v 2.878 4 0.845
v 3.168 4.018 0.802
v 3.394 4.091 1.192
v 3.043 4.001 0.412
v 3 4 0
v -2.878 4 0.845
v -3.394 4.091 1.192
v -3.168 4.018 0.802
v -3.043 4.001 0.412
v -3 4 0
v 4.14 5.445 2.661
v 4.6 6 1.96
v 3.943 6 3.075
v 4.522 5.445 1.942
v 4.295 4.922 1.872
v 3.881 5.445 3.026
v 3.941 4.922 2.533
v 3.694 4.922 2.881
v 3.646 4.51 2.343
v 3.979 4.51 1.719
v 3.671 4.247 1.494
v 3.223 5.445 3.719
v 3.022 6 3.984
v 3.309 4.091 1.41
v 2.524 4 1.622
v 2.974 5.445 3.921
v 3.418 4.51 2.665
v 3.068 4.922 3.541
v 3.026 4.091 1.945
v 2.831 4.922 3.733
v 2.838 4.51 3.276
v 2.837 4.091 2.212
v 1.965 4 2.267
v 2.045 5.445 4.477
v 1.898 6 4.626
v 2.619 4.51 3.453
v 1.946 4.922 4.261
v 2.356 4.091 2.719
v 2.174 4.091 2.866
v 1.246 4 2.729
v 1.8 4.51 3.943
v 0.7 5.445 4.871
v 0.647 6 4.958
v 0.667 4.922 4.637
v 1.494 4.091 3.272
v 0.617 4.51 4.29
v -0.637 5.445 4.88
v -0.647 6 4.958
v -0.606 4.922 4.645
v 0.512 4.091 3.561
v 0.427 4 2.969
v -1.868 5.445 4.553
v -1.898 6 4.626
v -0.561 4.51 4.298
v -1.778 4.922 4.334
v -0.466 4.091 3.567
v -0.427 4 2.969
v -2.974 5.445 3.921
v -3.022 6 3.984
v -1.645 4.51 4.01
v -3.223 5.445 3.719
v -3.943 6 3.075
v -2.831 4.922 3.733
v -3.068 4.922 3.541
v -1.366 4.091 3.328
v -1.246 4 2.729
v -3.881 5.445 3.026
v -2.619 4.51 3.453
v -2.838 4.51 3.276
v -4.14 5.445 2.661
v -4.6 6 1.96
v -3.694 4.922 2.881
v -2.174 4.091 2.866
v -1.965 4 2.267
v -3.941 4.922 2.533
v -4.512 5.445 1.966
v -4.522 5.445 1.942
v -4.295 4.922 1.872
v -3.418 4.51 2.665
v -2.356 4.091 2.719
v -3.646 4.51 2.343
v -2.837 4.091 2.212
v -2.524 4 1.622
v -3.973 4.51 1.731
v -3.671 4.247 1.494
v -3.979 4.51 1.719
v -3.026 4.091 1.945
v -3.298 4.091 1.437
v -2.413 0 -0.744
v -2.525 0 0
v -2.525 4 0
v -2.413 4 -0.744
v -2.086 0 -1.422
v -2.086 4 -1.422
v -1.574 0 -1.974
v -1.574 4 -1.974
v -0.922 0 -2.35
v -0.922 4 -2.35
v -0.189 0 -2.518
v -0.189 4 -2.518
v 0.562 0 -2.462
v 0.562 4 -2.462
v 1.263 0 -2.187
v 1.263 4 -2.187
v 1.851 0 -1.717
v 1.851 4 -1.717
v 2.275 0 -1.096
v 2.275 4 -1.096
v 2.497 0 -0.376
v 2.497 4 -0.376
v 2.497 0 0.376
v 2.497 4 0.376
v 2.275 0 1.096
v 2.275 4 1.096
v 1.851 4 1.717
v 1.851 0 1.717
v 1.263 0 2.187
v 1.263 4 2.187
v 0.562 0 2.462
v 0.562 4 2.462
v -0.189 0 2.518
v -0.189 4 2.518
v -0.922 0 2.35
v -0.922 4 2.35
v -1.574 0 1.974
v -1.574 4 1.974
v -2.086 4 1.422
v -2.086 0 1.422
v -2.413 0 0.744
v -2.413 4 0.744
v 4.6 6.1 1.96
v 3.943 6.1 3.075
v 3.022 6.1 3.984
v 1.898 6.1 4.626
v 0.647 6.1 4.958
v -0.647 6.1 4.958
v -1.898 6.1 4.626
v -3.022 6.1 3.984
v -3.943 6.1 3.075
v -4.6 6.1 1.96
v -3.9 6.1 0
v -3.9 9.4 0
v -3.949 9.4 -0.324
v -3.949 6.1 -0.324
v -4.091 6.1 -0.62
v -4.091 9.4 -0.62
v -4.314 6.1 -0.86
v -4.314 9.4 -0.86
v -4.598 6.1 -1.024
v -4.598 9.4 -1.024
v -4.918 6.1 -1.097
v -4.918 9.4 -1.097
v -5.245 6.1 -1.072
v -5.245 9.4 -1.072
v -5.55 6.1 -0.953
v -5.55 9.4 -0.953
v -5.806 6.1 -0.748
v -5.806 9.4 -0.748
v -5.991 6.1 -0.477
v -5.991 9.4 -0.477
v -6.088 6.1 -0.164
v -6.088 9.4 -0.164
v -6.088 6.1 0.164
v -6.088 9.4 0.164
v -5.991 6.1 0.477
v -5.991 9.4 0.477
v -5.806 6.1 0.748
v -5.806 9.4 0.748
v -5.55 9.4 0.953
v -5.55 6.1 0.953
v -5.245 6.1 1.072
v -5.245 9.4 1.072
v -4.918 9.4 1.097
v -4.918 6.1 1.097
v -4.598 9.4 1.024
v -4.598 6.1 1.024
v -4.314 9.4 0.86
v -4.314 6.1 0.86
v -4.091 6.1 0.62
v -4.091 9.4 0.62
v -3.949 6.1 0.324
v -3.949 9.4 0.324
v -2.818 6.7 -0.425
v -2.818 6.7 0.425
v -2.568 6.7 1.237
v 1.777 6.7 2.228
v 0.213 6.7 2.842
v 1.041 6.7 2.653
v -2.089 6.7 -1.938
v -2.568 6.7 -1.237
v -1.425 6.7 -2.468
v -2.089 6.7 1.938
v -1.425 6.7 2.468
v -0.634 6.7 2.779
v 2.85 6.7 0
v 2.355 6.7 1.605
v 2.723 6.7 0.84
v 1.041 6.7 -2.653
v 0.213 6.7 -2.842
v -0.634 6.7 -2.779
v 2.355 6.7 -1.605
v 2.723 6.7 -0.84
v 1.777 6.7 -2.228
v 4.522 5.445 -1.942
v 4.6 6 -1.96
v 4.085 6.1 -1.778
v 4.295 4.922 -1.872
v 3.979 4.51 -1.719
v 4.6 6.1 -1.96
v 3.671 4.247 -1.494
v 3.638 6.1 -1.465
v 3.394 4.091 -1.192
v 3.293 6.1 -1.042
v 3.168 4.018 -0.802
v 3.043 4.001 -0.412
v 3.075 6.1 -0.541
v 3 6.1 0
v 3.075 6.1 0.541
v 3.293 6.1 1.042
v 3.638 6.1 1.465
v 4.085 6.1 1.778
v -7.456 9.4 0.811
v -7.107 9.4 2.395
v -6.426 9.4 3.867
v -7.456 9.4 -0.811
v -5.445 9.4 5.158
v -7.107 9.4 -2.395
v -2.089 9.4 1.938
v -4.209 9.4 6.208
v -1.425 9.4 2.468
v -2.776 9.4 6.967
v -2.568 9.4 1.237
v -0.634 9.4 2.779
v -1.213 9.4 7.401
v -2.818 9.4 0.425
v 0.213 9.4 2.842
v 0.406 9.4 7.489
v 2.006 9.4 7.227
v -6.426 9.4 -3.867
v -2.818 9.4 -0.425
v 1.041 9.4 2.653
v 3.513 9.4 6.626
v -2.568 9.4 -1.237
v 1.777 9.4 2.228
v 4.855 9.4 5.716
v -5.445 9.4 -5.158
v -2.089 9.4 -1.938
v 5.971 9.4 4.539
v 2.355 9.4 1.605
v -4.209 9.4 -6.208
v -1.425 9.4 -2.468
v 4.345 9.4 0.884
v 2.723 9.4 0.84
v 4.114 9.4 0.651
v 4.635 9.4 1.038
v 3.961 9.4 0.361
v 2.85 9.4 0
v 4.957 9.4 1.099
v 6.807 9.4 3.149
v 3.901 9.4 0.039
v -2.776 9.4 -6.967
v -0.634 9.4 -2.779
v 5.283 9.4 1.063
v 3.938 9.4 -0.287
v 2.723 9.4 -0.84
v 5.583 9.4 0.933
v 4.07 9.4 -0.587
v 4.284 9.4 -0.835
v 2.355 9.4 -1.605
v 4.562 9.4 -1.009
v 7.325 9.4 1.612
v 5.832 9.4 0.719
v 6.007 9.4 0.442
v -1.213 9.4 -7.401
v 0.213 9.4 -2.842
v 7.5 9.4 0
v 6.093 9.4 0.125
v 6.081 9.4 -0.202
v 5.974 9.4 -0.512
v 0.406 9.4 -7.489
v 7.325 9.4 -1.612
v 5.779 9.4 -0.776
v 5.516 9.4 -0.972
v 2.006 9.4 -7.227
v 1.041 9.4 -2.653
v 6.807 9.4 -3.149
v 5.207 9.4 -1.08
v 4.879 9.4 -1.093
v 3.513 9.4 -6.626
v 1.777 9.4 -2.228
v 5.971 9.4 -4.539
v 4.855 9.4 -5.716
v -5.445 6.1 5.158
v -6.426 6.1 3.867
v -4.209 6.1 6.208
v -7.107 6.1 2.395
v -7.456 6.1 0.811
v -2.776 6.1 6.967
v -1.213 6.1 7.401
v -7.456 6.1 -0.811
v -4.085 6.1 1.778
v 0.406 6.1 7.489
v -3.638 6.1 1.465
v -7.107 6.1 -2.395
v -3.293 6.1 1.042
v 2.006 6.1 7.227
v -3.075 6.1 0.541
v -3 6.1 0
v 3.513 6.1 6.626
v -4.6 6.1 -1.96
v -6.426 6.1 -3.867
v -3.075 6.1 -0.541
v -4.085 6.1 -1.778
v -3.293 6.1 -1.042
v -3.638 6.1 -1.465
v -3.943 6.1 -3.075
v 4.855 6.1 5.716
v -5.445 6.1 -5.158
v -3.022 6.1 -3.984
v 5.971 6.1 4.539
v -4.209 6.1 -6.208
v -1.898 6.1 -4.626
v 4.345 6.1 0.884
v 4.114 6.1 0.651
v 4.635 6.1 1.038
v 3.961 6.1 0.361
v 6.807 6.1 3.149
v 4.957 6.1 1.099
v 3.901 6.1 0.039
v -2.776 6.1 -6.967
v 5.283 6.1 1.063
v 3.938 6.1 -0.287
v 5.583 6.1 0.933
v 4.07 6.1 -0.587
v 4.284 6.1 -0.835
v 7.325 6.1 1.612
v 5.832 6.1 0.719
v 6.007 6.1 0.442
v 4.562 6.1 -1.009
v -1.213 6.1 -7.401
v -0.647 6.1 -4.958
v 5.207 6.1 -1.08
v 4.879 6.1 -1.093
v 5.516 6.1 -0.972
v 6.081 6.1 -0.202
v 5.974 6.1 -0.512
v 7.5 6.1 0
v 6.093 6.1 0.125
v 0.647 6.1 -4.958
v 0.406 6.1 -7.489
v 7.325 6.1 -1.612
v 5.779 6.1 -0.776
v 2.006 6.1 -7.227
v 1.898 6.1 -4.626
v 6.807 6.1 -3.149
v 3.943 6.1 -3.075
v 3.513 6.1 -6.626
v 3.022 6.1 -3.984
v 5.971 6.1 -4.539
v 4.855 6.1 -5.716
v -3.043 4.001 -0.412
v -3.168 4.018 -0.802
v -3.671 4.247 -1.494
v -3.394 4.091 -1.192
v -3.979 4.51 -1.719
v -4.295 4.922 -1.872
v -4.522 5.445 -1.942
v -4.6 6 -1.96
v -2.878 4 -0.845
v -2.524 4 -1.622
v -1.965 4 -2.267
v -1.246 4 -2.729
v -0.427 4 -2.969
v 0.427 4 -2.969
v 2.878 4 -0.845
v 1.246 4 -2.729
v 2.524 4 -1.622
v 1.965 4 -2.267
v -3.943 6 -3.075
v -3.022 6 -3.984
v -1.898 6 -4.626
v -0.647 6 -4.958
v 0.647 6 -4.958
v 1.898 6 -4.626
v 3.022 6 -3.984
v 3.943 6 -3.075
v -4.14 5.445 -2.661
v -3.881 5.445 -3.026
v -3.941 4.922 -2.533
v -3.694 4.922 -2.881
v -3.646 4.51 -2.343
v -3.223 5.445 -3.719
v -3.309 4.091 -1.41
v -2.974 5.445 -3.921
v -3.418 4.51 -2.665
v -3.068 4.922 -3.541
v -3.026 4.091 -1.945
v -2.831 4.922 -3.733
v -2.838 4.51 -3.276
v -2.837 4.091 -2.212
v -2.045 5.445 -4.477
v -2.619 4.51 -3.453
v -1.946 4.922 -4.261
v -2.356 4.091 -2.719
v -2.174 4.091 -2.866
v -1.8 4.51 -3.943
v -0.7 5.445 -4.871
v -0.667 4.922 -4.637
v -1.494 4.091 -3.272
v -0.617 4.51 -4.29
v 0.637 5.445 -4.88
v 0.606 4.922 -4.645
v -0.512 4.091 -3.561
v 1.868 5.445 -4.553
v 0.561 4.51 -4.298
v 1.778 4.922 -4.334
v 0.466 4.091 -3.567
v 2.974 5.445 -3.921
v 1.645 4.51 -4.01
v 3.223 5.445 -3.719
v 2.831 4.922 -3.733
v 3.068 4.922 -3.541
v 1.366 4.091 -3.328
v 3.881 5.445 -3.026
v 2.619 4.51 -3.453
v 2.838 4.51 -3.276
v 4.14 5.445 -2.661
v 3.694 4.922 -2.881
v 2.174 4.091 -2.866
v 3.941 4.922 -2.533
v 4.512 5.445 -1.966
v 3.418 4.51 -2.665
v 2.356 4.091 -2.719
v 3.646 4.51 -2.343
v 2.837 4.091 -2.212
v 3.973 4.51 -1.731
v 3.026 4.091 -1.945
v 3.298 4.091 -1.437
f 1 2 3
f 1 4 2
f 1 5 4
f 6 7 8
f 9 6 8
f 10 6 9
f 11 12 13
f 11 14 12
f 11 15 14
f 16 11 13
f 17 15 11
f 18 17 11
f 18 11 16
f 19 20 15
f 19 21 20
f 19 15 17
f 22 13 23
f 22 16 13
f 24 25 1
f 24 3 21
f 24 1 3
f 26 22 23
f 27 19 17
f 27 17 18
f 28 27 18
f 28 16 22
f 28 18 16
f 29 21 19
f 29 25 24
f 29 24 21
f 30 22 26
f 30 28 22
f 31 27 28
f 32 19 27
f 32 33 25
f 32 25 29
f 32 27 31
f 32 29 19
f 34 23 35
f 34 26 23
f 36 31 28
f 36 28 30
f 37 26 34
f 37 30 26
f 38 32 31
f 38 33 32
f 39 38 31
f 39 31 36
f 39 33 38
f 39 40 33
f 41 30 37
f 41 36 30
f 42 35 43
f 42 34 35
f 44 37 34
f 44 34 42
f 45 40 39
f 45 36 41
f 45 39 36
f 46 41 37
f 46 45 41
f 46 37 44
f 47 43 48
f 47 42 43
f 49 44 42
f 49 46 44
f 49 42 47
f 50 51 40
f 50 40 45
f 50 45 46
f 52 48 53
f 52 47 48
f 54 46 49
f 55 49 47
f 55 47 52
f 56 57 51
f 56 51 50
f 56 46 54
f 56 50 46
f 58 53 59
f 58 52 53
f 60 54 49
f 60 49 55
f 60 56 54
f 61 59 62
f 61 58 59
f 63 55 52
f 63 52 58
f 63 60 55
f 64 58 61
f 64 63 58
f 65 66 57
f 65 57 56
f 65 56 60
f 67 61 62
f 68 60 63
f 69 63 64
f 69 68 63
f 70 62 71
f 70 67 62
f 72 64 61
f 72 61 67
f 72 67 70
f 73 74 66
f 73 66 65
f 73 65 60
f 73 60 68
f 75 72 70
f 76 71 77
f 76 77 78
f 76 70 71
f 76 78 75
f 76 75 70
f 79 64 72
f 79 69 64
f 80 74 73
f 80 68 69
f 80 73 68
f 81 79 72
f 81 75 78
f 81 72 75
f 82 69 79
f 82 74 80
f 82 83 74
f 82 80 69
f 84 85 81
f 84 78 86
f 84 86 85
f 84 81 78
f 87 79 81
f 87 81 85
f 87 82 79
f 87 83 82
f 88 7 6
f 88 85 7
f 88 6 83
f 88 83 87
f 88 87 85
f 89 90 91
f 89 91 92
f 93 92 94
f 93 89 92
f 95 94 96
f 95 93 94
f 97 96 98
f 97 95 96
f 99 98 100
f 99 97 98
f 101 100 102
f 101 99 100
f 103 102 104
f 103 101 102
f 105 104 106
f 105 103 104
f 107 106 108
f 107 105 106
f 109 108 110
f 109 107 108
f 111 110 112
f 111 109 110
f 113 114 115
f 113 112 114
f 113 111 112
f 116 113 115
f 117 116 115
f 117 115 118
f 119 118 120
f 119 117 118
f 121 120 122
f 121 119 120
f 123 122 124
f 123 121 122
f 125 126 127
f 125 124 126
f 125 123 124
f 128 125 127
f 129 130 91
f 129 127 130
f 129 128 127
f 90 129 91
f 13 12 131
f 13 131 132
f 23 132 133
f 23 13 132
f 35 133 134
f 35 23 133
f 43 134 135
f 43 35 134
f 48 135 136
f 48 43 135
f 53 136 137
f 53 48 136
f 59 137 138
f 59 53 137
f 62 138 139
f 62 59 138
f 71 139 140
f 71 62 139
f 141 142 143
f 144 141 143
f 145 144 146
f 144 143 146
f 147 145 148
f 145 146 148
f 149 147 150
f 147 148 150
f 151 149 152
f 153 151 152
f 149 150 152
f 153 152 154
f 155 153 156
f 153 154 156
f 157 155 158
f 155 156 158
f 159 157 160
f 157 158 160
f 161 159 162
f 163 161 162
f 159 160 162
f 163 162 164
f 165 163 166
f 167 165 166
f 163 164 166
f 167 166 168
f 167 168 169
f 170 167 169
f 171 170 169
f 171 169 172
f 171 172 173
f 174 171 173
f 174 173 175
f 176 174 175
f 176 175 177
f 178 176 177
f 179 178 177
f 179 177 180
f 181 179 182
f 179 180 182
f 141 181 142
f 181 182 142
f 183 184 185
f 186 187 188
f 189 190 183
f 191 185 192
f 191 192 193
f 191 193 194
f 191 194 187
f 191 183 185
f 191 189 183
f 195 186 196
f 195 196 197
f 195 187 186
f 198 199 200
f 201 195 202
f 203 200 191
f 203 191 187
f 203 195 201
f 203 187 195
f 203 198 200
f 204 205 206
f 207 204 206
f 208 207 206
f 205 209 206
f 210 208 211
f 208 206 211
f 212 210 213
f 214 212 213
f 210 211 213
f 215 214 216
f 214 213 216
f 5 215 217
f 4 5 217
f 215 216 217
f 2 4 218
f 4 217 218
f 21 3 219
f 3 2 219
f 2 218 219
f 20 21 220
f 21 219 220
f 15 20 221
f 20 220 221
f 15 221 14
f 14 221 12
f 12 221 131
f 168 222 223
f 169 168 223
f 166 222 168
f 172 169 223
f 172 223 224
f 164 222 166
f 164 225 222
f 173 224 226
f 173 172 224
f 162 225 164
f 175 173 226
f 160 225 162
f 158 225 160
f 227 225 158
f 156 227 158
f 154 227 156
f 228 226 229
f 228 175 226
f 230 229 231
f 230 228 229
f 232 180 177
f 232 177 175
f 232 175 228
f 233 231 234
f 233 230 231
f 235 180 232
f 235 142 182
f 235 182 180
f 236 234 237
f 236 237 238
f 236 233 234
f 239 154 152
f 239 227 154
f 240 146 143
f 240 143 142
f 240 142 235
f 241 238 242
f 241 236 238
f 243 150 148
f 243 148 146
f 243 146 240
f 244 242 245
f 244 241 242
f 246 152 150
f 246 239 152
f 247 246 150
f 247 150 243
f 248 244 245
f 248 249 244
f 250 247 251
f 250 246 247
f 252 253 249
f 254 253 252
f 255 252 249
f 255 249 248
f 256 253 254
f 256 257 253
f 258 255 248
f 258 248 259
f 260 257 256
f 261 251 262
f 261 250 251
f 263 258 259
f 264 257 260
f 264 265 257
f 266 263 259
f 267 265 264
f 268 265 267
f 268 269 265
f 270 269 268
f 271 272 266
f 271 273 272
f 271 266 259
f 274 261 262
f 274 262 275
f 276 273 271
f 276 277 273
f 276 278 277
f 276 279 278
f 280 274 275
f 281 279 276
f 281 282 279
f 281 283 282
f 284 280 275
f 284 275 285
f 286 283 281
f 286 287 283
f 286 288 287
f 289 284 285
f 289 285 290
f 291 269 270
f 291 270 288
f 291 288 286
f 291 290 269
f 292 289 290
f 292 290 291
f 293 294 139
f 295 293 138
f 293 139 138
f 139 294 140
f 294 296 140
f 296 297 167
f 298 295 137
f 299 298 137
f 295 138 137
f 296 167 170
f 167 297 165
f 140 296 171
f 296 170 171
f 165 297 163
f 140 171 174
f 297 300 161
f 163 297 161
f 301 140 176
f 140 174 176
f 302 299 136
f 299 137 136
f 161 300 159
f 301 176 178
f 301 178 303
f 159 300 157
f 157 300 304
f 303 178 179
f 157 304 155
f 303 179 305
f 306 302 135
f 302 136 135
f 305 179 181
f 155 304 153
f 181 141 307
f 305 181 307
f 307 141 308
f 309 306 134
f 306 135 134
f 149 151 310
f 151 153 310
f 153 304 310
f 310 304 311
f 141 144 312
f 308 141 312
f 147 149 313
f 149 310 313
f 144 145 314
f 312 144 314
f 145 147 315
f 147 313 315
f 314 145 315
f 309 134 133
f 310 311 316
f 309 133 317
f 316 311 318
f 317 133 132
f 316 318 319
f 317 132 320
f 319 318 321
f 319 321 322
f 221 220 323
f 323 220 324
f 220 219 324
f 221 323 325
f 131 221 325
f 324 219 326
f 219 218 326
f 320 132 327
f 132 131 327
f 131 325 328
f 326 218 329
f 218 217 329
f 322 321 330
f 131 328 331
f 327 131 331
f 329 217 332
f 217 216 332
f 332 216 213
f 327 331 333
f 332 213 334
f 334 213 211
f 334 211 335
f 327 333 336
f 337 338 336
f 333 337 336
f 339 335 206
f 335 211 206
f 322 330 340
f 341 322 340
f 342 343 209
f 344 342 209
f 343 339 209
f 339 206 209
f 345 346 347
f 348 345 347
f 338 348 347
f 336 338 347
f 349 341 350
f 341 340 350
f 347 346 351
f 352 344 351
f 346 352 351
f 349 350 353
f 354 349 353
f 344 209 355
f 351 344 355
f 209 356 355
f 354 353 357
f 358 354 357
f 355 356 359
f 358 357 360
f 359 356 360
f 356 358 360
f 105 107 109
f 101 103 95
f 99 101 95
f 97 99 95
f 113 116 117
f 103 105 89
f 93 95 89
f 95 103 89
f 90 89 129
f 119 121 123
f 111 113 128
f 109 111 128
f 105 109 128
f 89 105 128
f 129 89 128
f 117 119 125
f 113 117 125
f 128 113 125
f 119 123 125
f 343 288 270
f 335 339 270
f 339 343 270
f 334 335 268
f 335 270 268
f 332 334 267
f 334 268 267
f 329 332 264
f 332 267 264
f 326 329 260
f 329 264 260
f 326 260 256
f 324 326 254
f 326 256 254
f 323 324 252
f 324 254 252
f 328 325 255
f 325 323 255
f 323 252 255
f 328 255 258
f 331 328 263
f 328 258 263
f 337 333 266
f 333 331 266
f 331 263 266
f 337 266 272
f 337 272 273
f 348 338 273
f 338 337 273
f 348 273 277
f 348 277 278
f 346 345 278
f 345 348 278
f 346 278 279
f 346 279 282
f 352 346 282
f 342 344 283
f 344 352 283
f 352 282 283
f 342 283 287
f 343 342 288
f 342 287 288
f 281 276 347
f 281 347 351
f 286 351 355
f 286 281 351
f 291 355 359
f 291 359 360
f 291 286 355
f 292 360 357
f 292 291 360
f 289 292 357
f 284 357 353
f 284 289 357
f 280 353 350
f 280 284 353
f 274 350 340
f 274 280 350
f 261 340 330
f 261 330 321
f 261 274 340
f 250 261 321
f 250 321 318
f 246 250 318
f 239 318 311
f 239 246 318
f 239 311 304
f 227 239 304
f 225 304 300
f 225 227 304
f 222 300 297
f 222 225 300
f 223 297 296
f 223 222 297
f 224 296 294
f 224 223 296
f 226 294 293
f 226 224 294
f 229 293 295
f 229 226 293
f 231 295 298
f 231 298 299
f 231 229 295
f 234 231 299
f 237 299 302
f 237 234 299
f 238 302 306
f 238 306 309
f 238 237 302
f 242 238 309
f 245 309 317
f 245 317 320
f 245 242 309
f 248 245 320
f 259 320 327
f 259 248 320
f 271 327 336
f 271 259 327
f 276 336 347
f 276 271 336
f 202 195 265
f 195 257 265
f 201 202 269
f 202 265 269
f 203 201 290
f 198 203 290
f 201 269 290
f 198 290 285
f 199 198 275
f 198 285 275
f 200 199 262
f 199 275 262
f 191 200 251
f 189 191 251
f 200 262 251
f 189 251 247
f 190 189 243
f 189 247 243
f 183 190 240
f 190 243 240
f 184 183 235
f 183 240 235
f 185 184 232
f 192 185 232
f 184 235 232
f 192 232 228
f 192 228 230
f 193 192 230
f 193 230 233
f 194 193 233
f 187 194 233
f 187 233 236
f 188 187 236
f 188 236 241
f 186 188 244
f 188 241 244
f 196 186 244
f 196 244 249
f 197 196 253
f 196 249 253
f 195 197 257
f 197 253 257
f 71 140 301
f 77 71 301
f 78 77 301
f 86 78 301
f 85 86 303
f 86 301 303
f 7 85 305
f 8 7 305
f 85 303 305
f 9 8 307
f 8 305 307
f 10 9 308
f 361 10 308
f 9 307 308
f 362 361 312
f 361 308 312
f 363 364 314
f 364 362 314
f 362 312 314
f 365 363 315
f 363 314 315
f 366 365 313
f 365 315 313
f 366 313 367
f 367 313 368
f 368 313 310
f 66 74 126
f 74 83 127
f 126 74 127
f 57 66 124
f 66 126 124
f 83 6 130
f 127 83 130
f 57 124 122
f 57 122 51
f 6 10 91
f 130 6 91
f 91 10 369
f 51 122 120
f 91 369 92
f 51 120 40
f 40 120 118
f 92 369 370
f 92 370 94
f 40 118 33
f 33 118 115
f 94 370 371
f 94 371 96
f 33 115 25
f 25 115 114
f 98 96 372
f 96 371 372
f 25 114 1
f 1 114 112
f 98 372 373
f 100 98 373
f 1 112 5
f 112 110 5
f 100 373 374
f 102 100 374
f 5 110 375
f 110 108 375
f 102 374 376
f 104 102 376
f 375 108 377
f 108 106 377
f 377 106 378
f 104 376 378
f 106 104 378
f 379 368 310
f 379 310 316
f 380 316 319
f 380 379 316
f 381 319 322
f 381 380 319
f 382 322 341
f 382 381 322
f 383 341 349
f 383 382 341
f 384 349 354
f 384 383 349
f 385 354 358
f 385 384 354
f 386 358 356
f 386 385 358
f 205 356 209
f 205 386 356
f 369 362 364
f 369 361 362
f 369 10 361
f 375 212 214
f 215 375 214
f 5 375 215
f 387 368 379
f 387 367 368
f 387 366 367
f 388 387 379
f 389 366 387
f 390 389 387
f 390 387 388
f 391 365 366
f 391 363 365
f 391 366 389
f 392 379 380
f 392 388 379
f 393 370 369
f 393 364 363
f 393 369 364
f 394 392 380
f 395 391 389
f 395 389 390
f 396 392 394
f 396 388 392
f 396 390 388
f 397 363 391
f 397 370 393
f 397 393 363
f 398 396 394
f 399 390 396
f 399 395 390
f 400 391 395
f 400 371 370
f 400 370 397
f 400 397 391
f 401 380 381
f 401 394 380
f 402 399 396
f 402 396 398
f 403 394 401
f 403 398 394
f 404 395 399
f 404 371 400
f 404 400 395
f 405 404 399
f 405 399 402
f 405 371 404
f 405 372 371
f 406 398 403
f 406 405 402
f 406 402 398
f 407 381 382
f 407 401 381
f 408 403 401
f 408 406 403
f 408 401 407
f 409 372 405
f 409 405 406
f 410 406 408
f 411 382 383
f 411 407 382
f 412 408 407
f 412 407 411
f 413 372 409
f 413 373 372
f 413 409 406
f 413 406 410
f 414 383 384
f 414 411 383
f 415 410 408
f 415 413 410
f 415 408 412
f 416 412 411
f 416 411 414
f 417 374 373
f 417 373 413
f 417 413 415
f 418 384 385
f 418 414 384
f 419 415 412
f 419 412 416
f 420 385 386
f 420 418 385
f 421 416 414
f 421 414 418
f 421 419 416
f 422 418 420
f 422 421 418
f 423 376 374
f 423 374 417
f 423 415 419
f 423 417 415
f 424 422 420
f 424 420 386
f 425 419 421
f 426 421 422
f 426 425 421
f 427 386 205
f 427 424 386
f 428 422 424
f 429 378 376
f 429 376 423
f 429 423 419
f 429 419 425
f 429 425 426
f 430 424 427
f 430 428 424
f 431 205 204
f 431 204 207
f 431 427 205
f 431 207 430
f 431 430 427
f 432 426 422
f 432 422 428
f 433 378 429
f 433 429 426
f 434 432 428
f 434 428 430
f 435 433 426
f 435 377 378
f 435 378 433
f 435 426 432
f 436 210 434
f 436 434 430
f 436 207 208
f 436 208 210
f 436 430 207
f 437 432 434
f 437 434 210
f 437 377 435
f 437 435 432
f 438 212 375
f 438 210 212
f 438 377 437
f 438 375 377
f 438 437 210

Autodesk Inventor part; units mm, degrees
ref_plane "YZ Plane" through (0, 0, 0) normal (1, 0, 0) x (0, 1, 0)
ref_plane "XZ Plane" through (0, 0, 0) normal (0, 1, 0) x (-1, 0, 0)
ref_plane "XY Plane" through (0, 0, 0) normal (0, 0, 1) x (1, 0, 0)
sketch "Sketch1" plane through (0, 0, 0) normal (0, 1, 0) x (-1, 0, 0)
  circle A0 centre (0, 0) radius 2.525
  dimension "d0" = 5.05
extrude "Extrusion1" add sketch "Sketch1" along normal blind 4
sketch "Sketch2" plane through (0, 4, 0) normal (0, 1, 0) x (1, 0, 0)
  circle A0 centre (0, 0) radius 5
  dimension "d3" = 10
extrude "Extrusion2" add sketch "Sketch2" along normal blind 5.4
fillet "Fillet1" radius 2 1 edges at (-5, 4, 0)
sketch "Sketch3" plane through (0, 9.4, 0) normal (0, 1, 0) x (1, 0, 0)
  circle A0 centre (0, 0) radius 7.5
  circle A1 centre (0, 0) radius 6.25
  circle A2 centre (0, 0) radius 5 projected
  circle A3 centre (-5, 0) radius 1.1
  circle A4 centre (5, 0) radius 1.1
  point P0 (4.879, -1.0933)
  point P1 (-4.879, -1.0933)
  point P2 (-4.879, 1.0933)
  point P3 (4.879, 1.0933)
  dimension "d7" = 15
  dimension "d8" = 12.5
  dimension "d9" = 2.2
  dimension "d10" = 2.2
extrude "Extrusion3" add sketch "Sketch3" against normal blind 3.3 contours A0 | A1
extrude "Extrusion4" cut sketch "Sketch3" against normal blind 5.4 contours A2 A4 | A2 A4 | A3 A2 | A2 A3
sketch "Sketch4" plane through (0, 6.1, 0) normal (0, -1, 0) x (1, 0, 0)
  arc A0 (4.879, -1.0933) -> (4.879, 1.0933) centre (5, 0) ccw projected
  arc A1 (-4.879, 1.0933) -> (-4.879, -1.0933) centre (-5, 0) ccw projected
  circle A2 centre (-5, 0) radius 2
  circle A3 centre (0, 0) radius 3 projected
  circle A4 centre (5, 0) radius 2
extrude "Extrusion5" cut sketch "Sketch4" along normal blind 3.3 contours A2 | A4
sketch "Sketch5" plane through (0, 0, 0) normal (1, 0, 0) x (0, 1, 0)
  point P0 (0, 0)
sketch "Sketch6" plane through (0, 9.4, 0) normal (0, 1, 0) x (1, 0, 0)
  circle A0 centre (0, 0) radius 2.85
  dimension "d17" = 5.7
extrude "Extrusion6" cut sketch "Sketch6" against normal blind 2.7
properties part number "spinner_under_3DPrint"
